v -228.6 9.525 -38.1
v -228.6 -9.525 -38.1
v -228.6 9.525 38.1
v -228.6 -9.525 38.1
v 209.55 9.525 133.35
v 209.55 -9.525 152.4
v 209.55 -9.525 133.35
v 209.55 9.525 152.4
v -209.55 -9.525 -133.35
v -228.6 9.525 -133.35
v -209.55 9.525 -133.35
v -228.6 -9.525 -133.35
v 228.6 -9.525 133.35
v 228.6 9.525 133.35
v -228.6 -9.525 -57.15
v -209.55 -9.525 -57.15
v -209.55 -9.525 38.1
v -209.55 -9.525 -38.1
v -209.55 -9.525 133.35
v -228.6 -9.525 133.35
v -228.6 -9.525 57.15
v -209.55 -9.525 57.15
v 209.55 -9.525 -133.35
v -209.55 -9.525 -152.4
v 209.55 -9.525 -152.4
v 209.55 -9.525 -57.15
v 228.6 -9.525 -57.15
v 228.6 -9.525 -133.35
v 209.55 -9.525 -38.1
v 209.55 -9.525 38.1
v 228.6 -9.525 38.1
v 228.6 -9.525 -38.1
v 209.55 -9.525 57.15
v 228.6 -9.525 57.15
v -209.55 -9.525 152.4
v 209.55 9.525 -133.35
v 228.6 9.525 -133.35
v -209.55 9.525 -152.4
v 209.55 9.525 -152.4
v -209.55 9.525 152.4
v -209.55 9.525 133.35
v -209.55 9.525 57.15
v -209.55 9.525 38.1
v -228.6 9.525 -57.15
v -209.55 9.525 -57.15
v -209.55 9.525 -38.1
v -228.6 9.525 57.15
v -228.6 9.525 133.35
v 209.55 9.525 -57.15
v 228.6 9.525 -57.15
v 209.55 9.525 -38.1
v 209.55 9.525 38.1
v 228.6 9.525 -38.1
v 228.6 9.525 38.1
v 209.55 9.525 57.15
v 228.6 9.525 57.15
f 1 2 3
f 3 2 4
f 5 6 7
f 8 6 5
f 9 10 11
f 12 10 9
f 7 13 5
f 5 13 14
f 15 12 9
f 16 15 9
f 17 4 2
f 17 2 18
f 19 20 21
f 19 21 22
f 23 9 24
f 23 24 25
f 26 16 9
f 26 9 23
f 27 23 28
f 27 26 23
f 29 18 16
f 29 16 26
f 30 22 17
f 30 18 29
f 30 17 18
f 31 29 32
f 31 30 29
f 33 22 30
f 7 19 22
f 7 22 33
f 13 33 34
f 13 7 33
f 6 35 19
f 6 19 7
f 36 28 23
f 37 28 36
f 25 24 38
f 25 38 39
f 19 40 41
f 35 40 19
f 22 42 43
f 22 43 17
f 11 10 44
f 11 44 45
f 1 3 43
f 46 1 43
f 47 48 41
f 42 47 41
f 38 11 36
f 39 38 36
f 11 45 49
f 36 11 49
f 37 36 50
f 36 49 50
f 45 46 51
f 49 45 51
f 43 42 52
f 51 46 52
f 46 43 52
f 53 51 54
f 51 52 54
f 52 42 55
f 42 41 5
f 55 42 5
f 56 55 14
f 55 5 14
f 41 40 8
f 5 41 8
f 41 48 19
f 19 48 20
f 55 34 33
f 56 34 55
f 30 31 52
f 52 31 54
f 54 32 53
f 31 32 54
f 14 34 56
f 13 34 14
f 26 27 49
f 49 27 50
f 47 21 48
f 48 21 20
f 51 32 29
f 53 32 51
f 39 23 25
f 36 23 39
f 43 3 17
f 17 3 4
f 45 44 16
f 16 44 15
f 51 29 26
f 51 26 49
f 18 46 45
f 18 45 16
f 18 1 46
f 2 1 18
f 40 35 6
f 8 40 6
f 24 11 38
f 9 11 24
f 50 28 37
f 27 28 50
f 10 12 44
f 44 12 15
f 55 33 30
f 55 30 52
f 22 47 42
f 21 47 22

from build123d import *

# Parameters (mm, degrees)
F0_W     = 457.2
F0_H     = 304.8
F1_DEPTH = 9.525
F2_W     = 19.05
F2_H     = 19.05
F3_DEPTH = 19.05
F4_W     = 19.05
F4_H     = 19.05
F5_DEPTH = 19.05


with BuildPart() as f1:
    # F0 (on Front) → F1 (new body, symmetric)
    with BuildSketch(Plane.XZ):
        Rectangle(F0_W, F0_H)
    extrude(amount=F1_DEPTH, both=True)

    # F2 (on face) → F3 (cut)
    with BuildSketch(Plane(origin=(-228.6, 0, 0), x_dir=(0, -1, 0), z_dir=(-1, 0, 0))):
        with Locations((0, 142.875)):
            Rectangle(F2_W, F2_H)
        with Locations((0, 47.625)):
            Rectangle(F2_W, F2_H)
        with Locations((0, -47.625)):
            Rectangle(F2_W, F2_H)
        with Locations((0, -142.875)):
            Rectangle(F2_W, F2_H)
    extrude(amount=-F3_DEPTH, mode=Mode.SUBTRACT)

    # F4 (on face) → F5 (cut)
    with BuildSketch(Plane.YZ.offset(228.6)):
        with Locations((0, 142.875)):
            Rectangle(F4_W, F4_H)
        with Locations((0, 47.625)):
            Rectangle(F4_W, F4_H)
        with Locations((0, -47.625)):
            Rectangle(F4_W, F4_H)
        with Locations((0, -142.875)):
            Rectangle(F4_W, F4_H)
    extrude(amount=-F5_DEPTH, mode=Mode.SUBTRACT)


solid = f1.part
